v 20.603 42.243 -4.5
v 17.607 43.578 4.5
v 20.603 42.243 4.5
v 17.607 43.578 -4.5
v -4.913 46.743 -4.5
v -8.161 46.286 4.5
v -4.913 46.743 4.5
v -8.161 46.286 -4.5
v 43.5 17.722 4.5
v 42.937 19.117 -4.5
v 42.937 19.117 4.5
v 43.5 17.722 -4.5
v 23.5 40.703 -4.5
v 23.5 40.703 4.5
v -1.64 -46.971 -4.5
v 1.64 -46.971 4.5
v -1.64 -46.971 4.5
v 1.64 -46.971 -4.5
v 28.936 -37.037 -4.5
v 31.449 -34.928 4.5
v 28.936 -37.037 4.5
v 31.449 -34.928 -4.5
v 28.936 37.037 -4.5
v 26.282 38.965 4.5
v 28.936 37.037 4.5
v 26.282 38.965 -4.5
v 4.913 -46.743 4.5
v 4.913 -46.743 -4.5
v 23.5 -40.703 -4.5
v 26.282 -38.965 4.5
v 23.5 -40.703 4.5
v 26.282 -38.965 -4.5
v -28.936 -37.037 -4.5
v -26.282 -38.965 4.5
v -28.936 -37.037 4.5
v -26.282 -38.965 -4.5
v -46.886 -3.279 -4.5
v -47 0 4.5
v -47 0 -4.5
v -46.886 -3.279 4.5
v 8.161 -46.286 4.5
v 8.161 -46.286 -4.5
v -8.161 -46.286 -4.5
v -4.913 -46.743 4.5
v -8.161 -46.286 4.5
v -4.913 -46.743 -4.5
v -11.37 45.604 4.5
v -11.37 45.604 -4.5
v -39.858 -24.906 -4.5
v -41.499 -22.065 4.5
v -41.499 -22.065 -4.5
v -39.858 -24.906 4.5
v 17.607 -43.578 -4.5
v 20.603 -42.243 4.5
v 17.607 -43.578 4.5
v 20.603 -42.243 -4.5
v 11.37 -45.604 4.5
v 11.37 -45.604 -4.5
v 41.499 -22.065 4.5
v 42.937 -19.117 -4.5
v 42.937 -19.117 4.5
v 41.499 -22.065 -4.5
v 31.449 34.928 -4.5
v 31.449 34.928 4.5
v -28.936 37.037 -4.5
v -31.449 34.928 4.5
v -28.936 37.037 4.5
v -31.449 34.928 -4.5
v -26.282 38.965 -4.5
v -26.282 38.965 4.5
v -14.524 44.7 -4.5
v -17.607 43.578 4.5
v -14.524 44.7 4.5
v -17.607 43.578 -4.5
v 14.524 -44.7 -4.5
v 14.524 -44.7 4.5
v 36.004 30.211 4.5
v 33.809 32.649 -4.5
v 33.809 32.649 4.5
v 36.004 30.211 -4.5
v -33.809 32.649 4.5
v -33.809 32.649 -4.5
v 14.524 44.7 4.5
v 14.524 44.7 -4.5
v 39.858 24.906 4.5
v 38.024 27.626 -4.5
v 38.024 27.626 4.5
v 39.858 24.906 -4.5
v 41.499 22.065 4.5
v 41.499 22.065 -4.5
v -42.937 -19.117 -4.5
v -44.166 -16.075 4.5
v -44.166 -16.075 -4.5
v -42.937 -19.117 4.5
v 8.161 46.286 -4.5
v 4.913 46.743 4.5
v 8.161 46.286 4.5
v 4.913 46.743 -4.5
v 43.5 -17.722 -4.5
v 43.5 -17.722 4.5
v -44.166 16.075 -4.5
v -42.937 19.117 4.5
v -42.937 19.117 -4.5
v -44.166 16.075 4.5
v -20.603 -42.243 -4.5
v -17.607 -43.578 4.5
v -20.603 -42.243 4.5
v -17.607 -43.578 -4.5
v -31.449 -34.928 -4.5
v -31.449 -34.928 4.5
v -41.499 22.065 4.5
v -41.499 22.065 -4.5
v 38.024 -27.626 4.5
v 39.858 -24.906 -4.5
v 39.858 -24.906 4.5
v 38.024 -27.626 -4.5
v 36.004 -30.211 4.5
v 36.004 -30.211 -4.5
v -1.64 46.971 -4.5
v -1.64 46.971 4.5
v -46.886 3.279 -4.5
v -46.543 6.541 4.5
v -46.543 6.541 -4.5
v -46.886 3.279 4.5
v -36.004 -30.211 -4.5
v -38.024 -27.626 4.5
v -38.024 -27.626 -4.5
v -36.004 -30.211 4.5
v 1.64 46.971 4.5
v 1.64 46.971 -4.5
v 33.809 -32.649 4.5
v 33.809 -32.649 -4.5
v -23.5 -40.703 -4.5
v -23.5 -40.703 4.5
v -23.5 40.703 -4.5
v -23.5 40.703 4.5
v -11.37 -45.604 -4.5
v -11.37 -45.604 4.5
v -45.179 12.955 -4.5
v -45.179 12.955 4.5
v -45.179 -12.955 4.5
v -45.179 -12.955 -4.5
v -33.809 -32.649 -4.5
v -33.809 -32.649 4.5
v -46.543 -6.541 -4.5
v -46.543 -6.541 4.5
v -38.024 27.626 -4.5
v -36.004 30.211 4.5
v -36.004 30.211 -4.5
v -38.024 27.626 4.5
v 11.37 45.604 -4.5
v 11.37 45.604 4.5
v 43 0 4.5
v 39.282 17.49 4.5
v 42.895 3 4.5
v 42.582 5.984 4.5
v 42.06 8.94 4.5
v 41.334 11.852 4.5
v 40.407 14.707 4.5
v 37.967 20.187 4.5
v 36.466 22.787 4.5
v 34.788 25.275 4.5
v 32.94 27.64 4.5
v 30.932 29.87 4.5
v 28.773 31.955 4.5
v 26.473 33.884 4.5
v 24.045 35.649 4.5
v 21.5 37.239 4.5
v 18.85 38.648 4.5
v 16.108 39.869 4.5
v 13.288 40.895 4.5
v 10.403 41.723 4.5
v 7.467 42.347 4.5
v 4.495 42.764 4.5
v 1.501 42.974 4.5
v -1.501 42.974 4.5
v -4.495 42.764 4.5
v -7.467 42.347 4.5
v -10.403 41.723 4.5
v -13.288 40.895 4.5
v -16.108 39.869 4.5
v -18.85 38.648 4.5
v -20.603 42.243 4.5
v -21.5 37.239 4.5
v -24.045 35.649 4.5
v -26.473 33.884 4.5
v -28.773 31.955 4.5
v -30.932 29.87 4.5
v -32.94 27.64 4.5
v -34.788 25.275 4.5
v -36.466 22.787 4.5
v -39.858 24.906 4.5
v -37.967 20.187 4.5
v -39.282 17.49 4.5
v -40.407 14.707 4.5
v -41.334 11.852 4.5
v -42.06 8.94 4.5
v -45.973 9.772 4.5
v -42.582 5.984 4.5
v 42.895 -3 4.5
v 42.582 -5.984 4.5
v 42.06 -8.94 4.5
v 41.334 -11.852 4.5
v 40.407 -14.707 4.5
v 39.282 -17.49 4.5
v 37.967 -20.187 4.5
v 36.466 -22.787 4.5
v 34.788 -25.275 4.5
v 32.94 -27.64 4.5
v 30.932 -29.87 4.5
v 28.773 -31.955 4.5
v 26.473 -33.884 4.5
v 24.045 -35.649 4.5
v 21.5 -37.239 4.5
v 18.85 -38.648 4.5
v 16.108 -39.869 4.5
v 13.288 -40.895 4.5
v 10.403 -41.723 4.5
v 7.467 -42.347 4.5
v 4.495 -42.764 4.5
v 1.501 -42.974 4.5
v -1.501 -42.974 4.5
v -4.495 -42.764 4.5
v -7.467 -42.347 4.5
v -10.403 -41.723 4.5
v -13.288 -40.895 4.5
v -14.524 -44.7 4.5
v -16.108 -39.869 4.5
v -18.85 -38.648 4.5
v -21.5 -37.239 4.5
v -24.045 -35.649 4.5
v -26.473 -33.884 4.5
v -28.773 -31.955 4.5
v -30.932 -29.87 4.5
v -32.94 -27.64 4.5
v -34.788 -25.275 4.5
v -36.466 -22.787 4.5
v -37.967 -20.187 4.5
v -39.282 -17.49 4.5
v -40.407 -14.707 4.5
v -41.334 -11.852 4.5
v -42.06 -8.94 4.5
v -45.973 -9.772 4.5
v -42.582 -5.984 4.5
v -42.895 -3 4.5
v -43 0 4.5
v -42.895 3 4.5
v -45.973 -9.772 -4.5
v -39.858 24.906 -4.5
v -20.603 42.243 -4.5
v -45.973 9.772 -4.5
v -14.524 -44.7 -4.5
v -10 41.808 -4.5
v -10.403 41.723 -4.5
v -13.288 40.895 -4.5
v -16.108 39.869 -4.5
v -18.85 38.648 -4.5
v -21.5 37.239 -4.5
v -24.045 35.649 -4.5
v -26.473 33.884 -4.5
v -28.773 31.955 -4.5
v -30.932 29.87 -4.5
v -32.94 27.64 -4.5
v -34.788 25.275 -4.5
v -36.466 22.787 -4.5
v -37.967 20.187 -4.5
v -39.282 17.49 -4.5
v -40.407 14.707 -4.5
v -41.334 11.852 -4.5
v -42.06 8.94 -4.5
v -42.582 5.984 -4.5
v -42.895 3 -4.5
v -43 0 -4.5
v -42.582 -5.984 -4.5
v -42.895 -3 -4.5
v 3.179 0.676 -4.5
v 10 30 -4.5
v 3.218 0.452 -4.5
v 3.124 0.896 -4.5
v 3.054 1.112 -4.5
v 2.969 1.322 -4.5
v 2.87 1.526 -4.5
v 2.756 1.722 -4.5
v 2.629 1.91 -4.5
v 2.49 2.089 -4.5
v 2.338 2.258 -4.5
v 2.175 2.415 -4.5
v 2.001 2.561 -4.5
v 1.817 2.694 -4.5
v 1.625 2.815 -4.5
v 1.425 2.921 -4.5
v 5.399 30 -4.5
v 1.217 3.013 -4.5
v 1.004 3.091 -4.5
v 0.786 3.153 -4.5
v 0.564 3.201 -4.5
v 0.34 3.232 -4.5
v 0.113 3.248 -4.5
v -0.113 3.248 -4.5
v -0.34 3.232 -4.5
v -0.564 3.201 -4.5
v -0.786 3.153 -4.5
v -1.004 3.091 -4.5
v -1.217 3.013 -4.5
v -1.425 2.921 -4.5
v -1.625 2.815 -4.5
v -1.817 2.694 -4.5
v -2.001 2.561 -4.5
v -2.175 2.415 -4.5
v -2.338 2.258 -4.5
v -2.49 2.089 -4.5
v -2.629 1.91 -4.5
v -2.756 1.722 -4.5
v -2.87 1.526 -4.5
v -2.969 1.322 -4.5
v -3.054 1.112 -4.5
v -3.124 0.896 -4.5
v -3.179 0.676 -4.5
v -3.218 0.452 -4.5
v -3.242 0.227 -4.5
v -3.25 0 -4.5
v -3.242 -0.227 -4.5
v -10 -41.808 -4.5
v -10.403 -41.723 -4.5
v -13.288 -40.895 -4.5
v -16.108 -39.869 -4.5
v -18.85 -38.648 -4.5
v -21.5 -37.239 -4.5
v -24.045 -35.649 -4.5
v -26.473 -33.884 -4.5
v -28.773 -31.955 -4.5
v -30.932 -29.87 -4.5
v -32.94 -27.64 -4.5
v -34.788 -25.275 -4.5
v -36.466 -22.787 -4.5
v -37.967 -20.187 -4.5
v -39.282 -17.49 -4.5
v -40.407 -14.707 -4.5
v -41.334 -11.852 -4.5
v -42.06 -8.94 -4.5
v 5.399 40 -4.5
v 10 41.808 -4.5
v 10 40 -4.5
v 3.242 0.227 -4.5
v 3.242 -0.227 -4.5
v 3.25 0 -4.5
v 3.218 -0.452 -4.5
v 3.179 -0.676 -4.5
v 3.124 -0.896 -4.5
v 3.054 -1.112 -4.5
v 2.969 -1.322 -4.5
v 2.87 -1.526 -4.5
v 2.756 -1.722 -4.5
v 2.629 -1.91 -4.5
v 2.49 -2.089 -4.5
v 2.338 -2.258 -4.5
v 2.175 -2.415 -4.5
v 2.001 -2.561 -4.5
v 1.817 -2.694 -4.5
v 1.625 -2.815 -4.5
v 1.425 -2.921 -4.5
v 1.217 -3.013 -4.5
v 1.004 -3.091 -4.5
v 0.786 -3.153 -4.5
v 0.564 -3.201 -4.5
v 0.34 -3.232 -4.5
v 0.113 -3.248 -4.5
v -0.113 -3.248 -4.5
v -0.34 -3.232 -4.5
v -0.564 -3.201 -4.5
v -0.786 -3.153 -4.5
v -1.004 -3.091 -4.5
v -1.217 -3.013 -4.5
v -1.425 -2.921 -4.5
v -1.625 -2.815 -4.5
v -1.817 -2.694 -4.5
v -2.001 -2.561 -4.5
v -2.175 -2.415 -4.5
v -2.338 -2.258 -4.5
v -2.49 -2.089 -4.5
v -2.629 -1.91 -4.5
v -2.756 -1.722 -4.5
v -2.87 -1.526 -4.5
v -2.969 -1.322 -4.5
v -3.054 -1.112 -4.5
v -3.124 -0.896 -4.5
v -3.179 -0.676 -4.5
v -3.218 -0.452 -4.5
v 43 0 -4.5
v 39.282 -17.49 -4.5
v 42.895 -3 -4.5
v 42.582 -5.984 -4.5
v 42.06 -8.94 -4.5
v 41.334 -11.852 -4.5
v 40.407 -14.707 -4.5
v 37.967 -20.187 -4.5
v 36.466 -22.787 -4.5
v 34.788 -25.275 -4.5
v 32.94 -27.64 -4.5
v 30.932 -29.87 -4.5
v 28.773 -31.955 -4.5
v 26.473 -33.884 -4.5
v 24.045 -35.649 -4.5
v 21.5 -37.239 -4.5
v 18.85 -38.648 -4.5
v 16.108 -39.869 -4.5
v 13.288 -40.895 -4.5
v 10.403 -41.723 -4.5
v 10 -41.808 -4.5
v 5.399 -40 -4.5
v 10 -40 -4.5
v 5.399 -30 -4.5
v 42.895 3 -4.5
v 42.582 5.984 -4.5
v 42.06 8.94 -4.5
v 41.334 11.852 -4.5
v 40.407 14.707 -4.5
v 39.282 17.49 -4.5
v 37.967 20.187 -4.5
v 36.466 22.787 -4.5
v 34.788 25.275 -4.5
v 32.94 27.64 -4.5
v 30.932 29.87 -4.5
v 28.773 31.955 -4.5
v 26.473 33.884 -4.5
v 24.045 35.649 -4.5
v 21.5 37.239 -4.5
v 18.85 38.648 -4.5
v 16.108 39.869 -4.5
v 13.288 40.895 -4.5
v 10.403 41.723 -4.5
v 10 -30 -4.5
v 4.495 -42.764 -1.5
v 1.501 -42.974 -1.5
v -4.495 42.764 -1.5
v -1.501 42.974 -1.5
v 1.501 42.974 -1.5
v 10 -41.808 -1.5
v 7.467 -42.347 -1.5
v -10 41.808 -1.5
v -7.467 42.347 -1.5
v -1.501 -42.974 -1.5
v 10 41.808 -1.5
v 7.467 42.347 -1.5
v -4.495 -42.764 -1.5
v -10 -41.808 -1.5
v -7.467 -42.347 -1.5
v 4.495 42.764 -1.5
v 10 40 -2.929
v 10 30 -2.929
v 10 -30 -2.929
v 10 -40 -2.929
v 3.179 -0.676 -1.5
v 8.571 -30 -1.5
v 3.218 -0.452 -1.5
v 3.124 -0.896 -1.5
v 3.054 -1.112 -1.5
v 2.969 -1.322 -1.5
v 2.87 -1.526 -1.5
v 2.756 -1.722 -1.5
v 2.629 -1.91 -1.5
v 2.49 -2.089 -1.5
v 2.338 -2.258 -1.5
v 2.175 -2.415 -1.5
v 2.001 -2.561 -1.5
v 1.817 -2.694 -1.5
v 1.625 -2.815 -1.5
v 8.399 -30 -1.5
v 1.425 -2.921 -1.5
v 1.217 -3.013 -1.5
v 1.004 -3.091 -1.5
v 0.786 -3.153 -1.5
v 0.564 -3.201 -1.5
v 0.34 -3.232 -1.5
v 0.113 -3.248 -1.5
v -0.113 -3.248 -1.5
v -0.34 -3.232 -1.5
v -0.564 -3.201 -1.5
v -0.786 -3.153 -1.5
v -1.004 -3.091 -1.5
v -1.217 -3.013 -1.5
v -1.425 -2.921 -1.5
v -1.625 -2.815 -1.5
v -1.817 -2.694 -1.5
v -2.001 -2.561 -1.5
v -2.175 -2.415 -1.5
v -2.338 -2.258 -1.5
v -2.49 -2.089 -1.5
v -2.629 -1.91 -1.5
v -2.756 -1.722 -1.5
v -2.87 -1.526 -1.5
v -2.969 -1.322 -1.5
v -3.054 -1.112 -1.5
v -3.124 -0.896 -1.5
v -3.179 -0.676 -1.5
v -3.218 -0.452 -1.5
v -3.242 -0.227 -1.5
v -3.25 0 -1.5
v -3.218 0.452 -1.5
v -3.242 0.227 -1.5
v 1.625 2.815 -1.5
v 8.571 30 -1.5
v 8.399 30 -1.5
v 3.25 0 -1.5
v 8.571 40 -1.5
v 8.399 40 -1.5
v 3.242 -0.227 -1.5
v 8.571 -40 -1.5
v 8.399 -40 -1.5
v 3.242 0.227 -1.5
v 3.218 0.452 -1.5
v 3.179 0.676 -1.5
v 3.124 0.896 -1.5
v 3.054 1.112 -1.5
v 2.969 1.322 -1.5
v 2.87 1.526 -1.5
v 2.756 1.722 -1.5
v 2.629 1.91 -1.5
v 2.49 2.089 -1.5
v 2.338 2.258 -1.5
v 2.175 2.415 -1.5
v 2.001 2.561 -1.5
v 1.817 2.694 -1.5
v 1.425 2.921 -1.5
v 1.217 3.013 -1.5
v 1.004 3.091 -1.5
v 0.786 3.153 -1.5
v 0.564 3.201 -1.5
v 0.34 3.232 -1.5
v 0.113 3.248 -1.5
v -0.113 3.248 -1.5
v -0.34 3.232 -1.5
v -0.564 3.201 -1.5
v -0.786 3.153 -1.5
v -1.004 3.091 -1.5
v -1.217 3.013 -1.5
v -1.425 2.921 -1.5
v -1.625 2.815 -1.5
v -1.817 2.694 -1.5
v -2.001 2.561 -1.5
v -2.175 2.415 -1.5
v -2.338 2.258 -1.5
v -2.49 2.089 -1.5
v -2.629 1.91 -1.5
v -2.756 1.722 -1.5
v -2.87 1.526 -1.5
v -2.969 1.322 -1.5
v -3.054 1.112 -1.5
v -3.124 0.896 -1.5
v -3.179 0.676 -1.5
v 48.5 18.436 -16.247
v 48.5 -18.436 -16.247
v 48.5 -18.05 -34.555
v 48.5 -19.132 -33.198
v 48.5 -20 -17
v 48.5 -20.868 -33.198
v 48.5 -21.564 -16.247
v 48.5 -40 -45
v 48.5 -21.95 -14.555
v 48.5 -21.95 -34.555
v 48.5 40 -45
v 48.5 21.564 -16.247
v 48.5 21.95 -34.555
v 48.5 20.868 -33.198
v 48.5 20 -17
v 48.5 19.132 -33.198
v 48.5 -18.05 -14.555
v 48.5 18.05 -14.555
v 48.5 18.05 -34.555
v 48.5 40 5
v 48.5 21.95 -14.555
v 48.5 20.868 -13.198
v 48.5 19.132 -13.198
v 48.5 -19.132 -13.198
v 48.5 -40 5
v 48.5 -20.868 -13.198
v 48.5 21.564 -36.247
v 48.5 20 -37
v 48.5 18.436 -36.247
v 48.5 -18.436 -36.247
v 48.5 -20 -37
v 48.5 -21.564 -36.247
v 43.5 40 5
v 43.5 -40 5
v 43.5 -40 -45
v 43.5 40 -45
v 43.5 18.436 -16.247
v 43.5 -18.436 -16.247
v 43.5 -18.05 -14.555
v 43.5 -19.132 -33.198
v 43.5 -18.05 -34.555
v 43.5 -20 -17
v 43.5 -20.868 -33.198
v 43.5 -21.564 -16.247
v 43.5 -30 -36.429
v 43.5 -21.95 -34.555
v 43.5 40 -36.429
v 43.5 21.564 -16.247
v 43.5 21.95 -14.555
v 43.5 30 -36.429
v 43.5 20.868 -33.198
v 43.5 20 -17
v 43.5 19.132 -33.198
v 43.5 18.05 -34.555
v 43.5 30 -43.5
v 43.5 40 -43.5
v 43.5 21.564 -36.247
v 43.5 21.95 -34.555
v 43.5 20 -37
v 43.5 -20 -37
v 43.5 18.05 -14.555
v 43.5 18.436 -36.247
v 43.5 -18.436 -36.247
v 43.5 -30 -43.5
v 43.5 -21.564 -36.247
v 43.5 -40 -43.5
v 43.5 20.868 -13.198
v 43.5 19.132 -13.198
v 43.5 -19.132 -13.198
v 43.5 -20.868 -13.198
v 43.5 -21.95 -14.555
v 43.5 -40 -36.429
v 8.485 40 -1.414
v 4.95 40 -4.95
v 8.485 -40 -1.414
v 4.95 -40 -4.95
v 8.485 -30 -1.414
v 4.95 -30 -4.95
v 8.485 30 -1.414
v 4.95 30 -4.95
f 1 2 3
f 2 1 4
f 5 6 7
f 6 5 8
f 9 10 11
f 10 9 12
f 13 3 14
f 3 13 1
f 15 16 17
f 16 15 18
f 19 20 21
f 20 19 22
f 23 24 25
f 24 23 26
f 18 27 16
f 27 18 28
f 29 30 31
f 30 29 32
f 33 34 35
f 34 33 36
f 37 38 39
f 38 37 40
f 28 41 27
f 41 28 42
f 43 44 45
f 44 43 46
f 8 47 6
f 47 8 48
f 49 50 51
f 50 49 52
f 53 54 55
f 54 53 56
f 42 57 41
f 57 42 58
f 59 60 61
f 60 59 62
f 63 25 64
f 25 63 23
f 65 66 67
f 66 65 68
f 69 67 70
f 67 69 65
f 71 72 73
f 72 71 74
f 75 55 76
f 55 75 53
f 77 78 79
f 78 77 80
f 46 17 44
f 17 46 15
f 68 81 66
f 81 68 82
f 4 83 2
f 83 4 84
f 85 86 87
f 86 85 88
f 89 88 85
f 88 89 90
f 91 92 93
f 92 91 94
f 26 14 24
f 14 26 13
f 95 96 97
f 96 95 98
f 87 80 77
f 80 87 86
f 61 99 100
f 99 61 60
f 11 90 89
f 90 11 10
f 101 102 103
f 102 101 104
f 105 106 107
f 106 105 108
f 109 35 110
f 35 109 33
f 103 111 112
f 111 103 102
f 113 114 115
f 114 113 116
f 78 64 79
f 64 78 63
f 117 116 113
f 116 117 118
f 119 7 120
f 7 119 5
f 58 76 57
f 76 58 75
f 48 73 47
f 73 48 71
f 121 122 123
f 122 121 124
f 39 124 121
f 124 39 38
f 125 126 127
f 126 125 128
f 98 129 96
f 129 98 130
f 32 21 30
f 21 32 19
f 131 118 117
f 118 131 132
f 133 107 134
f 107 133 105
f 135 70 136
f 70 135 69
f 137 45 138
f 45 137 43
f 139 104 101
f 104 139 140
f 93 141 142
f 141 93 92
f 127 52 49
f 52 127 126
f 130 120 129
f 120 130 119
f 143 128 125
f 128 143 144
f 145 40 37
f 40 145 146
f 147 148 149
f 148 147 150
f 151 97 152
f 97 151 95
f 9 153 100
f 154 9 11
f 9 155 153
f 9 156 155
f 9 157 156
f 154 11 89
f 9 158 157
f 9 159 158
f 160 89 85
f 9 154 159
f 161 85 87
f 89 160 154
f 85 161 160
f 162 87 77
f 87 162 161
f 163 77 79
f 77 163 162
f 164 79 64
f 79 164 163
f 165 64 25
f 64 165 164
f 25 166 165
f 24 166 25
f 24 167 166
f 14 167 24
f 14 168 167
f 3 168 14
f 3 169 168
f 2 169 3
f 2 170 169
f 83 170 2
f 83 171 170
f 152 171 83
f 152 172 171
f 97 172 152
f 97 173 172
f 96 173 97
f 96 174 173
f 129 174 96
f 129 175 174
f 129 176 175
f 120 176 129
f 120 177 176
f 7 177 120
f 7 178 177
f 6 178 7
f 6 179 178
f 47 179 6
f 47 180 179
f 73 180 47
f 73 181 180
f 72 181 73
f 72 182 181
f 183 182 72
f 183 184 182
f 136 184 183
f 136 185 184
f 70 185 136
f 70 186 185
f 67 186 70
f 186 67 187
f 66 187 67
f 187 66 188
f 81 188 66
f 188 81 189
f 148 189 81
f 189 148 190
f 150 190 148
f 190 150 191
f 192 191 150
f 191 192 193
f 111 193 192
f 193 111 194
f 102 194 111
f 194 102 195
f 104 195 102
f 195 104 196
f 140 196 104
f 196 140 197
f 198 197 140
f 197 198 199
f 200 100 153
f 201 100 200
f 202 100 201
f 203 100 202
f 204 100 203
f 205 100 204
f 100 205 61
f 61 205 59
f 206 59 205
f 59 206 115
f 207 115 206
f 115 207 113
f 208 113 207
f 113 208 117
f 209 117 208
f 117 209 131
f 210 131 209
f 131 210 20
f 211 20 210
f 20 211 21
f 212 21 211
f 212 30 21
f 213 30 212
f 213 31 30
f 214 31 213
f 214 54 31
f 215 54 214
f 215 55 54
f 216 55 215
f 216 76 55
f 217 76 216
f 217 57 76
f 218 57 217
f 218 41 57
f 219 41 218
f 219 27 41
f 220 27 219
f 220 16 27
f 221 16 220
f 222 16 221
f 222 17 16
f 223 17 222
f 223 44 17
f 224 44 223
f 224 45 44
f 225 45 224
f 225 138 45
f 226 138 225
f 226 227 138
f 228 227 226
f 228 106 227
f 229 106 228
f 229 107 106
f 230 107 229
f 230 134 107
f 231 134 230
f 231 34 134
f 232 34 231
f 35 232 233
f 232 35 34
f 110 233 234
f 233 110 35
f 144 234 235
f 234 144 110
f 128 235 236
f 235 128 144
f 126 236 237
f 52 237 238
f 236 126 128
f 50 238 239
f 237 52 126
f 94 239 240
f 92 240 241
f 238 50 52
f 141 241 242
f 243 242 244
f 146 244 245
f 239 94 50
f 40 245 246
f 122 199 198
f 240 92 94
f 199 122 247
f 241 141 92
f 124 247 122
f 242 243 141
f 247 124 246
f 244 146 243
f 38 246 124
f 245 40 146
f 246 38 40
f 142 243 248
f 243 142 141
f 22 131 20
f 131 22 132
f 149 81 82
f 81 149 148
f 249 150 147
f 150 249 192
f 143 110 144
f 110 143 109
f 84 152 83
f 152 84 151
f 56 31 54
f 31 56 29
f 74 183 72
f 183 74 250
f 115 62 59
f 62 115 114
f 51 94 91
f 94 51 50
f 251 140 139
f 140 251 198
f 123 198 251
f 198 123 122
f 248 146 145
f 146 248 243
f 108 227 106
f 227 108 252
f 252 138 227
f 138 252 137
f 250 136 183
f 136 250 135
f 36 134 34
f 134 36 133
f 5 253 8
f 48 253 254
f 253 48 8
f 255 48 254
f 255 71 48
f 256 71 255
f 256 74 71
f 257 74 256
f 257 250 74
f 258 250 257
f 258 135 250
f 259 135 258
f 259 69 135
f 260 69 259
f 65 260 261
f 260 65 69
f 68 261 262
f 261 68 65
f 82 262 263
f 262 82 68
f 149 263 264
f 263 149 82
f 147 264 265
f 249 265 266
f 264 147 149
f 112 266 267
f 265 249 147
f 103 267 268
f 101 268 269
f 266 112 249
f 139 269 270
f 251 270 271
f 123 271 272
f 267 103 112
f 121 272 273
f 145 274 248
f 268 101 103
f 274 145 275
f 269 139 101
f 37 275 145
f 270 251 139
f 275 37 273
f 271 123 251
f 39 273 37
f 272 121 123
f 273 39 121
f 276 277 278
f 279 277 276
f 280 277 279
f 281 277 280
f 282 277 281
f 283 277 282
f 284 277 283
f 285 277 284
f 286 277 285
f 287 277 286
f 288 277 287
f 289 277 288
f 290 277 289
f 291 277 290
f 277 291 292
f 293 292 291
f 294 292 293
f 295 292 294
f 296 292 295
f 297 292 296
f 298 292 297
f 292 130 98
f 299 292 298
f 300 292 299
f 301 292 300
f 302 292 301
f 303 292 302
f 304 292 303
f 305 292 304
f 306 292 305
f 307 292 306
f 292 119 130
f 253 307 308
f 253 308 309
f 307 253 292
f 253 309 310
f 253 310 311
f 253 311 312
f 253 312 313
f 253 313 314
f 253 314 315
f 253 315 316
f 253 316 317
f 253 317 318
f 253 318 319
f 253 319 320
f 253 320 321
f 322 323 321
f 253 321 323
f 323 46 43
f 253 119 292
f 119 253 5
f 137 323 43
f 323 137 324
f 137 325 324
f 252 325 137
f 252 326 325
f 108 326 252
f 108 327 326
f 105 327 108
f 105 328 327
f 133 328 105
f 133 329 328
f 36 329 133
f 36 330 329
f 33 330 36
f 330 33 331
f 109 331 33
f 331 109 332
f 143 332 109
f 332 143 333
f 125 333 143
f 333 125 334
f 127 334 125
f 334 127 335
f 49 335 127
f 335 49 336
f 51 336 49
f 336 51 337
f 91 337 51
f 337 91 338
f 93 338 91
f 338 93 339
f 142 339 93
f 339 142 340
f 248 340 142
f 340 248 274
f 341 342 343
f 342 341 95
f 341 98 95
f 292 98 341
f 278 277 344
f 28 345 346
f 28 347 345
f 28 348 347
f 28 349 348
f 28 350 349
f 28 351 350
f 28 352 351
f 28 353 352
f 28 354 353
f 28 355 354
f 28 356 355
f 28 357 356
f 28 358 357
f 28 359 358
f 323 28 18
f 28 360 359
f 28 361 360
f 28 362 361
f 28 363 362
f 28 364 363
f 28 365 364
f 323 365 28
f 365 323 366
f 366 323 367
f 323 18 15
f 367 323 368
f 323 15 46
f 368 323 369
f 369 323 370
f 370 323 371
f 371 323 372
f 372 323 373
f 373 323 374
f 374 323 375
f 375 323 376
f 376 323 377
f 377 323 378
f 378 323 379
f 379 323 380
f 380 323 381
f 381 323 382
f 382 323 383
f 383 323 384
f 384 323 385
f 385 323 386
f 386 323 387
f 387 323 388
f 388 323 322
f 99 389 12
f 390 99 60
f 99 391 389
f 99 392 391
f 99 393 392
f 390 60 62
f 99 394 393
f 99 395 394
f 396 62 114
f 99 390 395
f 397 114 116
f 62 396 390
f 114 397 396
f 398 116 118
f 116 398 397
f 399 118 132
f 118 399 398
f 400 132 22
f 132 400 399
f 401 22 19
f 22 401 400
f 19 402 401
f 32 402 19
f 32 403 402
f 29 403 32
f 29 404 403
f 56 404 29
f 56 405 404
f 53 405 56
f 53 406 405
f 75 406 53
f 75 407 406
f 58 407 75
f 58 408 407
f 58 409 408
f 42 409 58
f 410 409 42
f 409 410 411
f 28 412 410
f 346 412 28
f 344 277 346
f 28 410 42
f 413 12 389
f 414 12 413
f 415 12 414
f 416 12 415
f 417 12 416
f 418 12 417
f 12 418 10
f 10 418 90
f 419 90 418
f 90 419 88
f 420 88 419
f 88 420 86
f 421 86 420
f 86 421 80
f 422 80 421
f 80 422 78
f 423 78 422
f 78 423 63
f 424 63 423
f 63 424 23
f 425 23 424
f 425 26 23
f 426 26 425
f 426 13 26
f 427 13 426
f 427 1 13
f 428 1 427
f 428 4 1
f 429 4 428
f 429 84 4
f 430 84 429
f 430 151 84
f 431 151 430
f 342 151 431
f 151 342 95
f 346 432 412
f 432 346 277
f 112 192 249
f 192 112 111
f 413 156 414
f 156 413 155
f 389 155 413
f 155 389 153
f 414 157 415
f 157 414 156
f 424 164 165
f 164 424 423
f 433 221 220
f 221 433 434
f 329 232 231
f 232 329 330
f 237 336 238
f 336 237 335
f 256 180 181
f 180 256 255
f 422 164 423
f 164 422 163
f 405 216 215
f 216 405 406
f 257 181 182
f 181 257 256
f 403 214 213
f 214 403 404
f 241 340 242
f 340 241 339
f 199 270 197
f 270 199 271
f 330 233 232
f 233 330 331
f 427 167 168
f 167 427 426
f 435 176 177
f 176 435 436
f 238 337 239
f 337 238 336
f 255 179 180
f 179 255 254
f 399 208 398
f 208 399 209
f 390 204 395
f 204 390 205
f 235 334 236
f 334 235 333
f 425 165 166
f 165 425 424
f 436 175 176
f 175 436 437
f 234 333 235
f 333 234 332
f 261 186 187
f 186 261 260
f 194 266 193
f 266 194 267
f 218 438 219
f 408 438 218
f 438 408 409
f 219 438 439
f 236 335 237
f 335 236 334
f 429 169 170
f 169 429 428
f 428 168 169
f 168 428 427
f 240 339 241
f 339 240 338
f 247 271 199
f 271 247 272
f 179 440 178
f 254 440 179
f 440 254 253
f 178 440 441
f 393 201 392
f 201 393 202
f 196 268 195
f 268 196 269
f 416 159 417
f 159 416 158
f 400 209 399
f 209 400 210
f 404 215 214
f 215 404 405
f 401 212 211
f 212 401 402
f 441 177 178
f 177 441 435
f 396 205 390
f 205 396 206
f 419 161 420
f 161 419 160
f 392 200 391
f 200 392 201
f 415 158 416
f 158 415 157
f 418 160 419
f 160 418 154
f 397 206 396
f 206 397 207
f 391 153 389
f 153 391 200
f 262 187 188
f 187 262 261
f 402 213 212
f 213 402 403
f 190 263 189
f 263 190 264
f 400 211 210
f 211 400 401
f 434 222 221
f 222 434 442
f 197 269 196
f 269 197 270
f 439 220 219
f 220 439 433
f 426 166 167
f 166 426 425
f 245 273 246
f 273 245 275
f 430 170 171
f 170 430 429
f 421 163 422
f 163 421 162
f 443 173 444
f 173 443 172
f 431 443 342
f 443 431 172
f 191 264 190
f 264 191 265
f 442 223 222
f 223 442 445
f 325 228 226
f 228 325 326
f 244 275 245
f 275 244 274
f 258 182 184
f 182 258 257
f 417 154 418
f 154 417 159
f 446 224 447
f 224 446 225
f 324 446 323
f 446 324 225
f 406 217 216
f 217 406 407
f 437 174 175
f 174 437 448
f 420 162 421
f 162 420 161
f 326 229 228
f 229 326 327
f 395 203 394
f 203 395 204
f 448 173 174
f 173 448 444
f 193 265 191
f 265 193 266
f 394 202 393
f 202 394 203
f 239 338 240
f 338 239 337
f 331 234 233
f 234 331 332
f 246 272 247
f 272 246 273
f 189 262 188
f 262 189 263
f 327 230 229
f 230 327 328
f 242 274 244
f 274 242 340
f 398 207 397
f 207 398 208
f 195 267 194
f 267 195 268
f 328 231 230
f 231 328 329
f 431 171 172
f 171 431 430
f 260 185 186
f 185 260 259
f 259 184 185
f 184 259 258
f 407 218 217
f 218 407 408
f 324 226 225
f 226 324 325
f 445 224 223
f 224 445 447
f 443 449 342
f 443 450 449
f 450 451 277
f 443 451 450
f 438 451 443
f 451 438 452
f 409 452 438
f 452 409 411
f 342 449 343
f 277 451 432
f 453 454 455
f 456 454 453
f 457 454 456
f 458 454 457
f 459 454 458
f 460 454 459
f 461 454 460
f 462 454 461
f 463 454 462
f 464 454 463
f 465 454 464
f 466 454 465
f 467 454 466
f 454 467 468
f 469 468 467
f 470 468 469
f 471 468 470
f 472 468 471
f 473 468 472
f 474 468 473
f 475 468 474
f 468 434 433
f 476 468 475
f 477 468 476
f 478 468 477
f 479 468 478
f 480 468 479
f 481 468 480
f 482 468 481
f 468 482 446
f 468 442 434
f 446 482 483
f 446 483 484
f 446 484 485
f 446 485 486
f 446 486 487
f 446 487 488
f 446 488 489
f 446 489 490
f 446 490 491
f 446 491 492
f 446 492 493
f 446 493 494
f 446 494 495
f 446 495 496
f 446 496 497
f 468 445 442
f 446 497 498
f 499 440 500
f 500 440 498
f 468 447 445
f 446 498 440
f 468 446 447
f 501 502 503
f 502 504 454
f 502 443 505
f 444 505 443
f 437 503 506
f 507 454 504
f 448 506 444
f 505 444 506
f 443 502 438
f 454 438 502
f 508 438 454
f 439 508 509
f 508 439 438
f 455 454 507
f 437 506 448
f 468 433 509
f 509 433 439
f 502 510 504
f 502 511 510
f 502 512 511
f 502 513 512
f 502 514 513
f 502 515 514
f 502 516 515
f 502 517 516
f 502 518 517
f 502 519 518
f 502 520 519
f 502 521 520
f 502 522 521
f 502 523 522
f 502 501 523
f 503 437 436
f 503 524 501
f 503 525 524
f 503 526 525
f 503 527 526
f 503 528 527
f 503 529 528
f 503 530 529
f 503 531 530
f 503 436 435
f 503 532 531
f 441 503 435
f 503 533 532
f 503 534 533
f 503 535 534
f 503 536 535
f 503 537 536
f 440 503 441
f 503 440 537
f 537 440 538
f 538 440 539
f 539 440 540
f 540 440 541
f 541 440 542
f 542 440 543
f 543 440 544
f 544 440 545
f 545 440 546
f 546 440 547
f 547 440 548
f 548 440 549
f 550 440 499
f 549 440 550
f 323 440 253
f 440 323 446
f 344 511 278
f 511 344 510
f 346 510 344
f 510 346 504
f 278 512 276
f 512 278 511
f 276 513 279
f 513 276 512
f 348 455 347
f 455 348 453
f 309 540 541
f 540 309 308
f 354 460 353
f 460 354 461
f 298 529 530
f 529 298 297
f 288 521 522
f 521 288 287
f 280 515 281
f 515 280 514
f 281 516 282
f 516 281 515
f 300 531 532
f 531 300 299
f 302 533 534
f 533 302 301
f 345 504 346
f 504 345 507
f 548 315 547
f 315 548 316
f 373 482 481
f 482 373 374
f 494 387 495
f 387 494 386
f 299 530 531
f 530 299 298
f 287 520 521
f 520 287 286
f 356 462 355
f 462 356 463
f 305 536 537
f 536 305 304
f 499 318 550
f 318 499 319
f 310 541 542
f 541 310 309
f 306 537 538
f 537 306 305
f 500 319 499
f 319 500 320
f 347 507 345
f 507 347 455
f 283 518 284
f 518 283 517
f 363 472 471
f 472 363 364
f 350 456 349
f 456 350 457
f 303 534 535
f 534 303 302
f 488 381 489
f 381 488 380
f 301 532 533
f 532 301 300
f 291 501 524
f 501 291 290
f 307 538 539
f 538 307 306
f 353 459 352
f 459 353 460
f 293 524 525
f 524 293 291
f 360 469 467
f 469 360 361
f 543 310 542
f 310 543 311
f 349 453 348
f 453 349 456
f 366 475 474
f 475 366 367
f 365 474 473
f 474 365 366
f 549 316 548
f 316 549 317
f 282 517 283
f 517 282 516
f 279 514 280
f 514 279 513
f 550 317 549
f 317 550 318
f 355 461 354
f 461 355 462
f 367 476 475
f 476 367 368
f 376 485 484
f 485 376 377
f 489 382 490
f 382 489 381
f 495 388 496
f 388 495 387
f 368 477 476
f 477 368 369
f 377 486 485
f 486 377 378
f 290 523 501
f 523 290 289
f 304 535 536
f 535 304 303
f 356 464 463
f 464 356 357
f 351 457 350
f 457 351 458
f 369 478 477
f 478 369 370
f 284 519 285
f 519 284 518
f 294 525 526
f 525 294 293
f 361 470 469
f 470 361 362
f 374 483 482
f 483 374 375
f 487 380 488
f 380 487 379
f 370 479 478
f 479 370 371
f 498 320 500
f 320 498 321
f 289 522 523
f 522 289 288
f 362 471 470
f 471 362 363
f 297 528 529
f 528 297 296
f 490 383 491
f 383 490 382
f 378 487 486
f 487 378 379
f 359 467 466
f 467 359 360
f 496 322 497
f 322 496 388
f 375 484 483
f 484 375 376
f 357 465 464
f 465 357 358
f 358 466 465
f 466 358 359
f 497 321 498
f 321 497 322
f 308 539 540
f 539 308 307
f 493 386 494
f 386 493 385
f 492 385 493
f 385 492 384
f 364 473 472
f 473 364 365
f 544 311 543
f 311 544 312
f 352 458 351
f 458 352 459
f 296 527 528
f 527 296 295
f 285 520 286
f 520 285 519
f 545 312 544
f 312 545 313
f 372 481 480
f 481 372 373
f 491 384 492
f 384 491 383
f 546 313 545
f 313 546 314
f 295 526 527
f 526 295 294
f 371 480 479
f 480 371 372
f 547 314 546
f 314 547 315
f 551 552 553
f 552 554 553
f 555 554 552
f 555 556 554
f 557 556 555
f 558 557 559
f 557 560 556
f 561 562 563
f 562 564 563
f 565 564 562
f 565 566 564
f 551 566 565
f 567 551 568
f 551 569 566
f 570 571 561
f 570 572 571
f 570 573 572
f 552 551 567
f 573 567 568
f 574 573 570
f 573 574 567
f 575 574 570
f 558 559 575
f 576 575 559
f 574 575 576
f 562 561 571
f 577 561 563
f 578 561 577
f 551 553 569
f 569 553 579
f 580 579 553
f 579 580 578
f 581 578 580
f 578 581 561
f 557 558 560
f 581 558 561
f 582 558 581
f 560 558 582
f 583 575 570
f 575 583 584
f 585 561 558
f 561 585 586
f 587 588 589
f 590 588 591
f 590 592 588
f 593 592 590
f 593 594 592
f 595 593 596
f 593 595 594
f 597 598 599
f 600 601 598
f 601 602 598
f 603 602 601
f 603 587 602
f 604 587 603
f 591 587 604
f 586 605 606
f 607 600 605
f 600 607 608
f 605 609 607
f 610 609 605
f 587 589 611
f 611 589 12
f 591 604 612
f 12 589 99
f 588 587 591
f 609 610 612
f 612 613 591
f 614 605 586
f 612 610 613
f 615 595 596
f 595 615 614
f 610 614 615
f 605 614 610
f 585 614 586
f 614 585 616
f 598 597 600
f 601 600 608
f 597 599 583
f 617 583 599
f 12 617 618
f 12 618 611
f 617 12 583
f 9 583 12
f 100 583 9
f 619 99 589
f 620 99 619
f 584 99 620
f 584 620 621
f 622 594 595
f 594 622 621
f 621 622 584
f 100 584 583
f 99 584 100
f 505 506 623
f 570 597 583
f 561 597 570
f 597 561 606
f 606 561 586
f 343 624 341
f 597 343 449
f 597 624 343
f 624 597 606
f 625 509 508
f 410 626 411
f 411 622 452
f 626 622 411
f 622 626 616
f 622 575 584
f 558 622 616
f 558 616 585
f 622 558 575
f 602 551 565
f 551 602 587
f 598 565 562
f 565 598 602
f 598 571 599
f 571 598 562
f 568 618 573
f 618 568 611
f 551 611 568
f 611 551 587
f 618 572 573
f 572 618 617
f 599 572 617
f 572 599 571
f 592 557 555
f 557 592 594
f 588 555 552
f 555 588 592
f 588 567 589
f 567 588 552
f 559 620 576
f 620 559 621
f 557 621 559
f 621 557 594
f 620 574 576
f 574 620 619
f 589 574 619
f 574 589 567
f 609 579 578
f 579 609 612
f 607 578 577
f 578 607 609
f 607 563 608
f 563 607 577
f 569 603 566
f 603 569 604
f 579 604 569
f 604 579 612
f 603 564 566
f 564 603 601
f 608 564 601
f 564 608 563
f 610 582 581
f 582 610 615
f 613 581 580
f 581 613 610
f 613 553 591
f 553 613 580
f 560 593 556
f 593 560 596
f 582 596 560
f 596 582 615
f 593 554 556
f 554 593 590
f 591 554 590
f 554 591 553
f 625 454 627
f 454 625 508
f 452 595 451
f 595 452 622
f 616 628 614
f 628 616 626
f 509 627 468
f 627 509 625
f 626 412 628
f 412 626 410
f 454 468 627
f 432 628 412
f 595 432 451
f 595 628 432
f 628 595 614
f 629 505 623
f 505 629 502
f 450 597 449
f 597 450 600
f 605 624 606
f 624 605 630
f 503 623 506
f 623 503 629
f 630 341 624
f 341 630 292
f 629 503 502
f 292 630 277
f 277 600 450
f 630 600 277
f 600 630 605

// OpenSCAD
//Netatmo Regensensorboden


module Wand() {
    $fn=90;
    difference(){
        cylinder(h=9,d=94,center=true);
        cylinder(h=10,d=86,center=true);
    }
}


module Boden() {
    $fn=90;
    translate([0,0,-3])
    difference() {
//        cylinder(h=3,d=94,center=true);
        cube([20,90,3],center=true);
        cylinder(h=7,d=6.5,center=true);
    }
}


module Halter() {
    difference() {
        translate([46,0,-20])
        cube([5,80,50],center=true);
        cylinder(h=10,d=86,center=true);
        
        rotate([0,90,0])
        translate([15,20,0])
        cylinder(h=150,d=4,center=true);    
        
        rotate([0,90,0])
        translate([15,-20,0])
        cylinder(h=150,d=4,center=true);    
        
        rotate([0,90,0])
        translate([35,20,0])
        cylinder(h=150,d=4,center=true);    
        
        rotate([0,90,0])
        translate([35,-20,0])
        cylinder(h=150,d=4,center=true);   
   }
   
   rotate([0,45,0])
   translate([7,-40,0])
   cube([55,10,5]);
   
   rotate([0,45,0])
   translate([7,30,0])
   cube([55,10,5]);
}

Wand();
Boden();
Halter();
